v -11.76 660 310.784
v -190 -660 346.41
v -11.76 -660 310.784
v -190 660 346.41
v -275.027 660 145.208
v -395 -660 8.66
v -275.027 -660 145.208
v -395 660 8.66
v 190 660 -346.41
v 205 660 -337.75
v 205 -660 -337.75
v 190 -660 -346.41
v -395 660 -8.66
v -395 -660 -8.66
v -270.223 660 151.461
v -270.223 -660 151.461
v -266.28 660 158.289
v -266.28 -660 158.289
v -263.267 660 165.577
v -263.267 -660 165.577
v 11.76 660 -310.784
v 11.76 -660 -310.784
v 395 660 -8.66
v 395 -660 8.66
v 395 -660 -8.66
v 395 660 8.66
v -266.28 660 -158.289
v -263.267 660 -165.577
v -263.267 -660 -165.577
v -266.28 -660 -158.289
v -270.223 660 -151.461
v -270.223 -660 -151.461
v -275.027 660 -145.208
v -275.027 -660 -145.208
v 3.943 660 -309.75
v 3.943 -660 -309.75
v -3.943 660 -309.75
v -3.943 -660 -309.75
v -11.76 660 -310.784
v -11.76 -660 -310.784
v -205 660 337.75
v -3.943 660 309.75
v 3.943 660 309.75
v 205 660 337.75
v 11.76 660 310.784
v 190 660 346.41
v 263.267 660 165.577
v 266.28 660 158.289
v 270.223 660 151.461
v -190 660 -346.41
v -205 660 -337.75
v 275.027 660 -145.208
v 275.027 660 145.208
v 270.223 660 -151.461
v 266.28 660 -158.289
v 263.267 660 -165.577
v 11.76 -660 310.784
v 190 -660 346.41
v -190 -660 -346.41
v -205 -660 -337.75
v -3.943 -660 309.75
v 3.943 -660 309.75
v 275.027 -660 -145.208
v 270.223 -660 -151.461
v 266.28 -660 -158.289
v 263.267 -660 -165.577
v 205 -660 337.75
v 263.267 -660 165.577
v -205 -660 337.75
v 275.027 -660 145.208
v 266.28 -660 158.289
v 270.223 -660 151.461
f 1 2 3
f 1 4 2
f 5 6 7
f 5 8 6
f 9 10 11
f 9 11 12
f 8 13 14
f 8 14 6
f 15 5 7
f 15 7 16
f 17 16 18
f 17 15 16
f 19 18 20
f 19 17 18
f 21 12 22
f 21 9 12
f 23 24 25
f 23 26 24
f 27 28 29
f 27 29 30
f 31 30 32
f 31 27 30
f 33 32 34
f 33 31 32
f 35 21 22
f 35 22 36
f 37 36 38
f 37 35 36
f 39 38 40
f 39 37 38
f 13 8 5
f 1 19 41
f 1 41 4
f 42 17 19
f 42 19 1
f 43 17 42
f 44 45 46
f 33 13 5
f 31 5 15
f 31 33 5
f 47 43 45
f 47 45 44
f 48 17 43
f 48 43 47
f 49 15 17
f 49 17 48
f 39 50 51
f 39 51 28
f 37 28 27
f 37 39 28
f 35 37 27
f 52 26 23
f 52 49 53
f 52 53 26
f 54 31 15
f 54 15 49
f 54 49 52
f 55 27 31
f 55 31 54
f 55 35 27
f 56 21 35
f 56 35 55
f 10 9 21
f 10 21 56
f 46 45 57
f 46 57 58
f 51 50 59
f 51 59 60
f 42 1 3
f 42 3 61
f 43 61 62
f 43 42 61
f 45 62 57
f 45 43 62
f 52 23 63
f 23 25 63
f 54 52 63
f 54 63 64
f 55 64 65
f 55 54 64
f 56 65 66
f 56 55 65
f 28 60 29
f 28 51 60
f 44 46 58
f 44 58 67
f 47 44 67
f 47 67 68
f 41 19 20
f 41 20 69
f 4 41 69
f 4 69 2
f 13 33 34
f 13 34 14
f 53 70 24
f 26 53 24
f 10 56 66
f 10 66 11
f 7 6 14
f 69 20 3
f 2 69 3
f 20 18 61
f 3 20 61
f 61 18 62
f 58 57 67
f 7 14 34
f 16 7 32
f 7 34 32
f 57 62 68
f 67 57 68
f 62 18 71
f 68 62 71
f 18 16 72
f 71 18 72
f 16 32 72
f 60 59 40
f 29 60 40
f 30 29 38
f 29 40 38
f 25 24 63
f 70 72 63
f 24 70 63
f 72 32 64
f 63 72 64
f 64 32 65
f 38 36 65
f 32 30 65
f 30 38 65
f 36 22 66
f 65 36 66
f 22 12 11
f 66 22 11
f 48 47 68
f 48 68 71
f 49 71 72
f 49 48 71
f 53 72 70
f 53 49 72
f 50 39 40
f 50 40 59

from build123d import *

# Parameters (mm, degrees)
EXTRUDE_1_DEPTH          = 660
CUT_EXTRUDE_1_DEPTH      = 661
CUT_EXTRUDE_1_DEPTH_BACK = 661


with BuildPart() as part:
    # 草图1 → 凸台-拉伸1 (new body, symmetric)
    with BuildSketch(Plane(origin=(0, 0, 0), x_dir=(1, 0, 0), z_dir=(0, 1, 0))):
        Polygon((395, 8.660254038), (205, 337.749907476), (190, 346.410161514), (-190, 346.410161514), (-205, 337.749907476), (-395, 8.660254038), (-395, -8.660254038), (-205, -337.749907476), (-190, -346.410161514), (190, -346.410161514), (205, -337.749907476), (395, -8.660254038), align=None)
    extrude(amount=EXTRUDE_1_DEPTH, both=True)

    # 草图4 → 切除-拉伸1 (cut, two sides)
    with BuildSketch(Plane(origin=(0, 0, 0), x_dir=(1, 0, 0), z_dir=(0, 1, 0))) as cut_extrude_1_sk:
        with BuildLine():
            Line((190, 369.620348729), (190, 346.410161514))
            Line((190, 346.410161514), (11.76, 310.784114995))
            ThreePointArc((11.76, 310.784114995), (0, 309.620348729), (-11.76, 310.784114995))
            Line((-11.76, 310.784114995), (-190, 346.410161514))
            Line((-190, 346.410161514), (-190, 369.620348729))
            Line((-190, 369.620348729), (-190, 392.830535944))
            Line((-190, 392.830535944), (-11.76, 428.456582463))
            ThreePointArc((-11.76, 428.456582463), (0, 429.620348729), (11.76, 428.456582463))
            Line((11.76, 428.456582463), (190, 392.830535944))
            Line((190, 392.830535944), (190, 369.620348729))
        make_face()
        with BuildLine():
            Line((415.100611755, 20.265347645), (395, 8.660254038))
            Line((395, 8.660254038), (275.026938678, 145.207598749))
            ThreePointArc((275.026938678, 145.207598749), (268.139087528, 154.810174364), (263.266938678, 165.576516246))
            Line((263.266938678, 165.576516246), (205, 337.749907476))
            Line((205, 337.749907476), (225.100611755, 349.355001084))
            Line((225.100611755, 349.355001084), (245.20122351, 360.960094691))
            Line((245.20122351, 360.960094691), (365.174284832, 224.41274998))
            ThreePointArc((365.174284832, 224.41274998), (372.062135982, 214.810174364), (376.934284832, 204.043832483))
            Line((376.934284832, 204.043832483), (435.20122351, 31.870441253))
            Line((435.20122351, 31.870441253), (415.100611755, 20.265347645))
        make_face()
        with BuildLine():
            Line((225.100611755, -349.355001084), (205, -337.749907476))
            Line((205, -337.749907476), (263.266938678, -165.576516246))
            ThreePointArc((263.266938678, -165.576516246), (268.139087528, -154.810174364), (275.026938678, -145.207598749))
            Line((275.026938678, -145.207598749), (395, -8.660254038))
            Line((395, -8.660254038), (415.100611755, -20.265347645))
            Line((415.100611755, -20.265347645), (435.20122351, -31.870441253))
            Line((435.20122351, -31.870441253), (376.934284832, -204.043832483))
            ThreePointArc((376.934284832, -204.043832483), (372.062135982, -214.810174364), (365.174284832, -224.41274998))
            Line((365.174284832, -224.41274998), (245.20122351, -360.960094691))
            Line((245.20122351, -360.960094691), (225.100611755, -349.355001084))
        make_face()
        with BuildLine():
            Line((-190, -369.620348729), (-190, -346.410161514))
            Line((-190, -346.410161514), (-11.76, -310.784114995))
            ThreePointArc((-11.76, -310.784114995), (0, -309.620348729), (11.76, -310.784114995))
            Line((11.76, -310.784114995), (190, -346.410161514))
            Line((190, -346.410161514), (190, -369.620348729))
            Line((190, -369.620348729), (190, -392.830535944))
            Line((190, -392.830535944), (11.76, -428.456582463))
            ThreePointArc((11.76, -428.456582463), (0, -429.620348729), (-11.76, -428.456582463))
            Line((-11.76, -428.456582463), (-190, -392.830535944))
            Line((-190, -392.830535944), (-190, -369.620348729))
        make_face()
        with BuildLine():
            Line((-415.100611755, -20.265347645), (-395, -8.660254038))
            Line((-395, -8.660254038), (-275.026938678, -145.207598749))
            ThreePointArc((-275.026938678, -145.207598749), (-268.139087528, -154.810174364), (-263.266938678, -165.576516246))
            Line((-263.266938678, -165.576516246), (-205, -337.749907476))
            Line((-205, -337.749907476), (-225.100611755, -349.355001084))
            Line((-225.100611755, -349.355001084), (-245.20122351, -360.960094691))
            Line((-245.20122351, -360.960094691), (-365.174284832, -224.41274998))
            ThreePointArc((-365.174284832, -224.41274998), (-372.062135982, -214.810174364), (-376.934284832, -204.043832483))
            Line((-376.934284832, -204.043832483), (-435.20122351, -31.870441253))
            Line((-435.20122351, -31.870441253), (-415.100611755, -20.265347645))
        make_face()
        with BuildLine():
            Line((-225.100611755, 349.355001084), (-205, 337.749907476))
            Line((-205, 337.749907476), (-263.266938678, 165.576516246))
            ThreePointArc((-263.266938678, 165.576516246), (-268.139087528, 154.810174364), (-275.026938678, 145.207598749))
            Line((-275.026938678, 145.207598749), (-395, 8.660254038))
            Line((-395, 8.660254038), (-415.100611755, 20.265347645))
            Line((-415.100611755, 20.265347645), (-435.20122351, 31.870441253))
            Line((-435.20122351, 31.870441253), (-376.934284832, 204.043832483))
            ThreePointArc((-376.934284832, 204.043832483), (-372.062135982, 214.810174364), (-365.174284832, 224.41274998))
            Line((-365.174284832, 224.41274998), (-245.20122351, 360.960094691))
            Line((-245.20122351, 360.960094691), (-225.100611755, 349.355001084))
        make_face()
    extrude(amount=CUT_EXTRUDE_1_DEPTH, mode=Mode.SUBTRACT)
    extrude(cut_extrude_1_sk.sketch, amount=-CUT_EXTRUDE_1_DEPTH_BACK, mode=Mode.SUBTRACT)


solid = part.part
